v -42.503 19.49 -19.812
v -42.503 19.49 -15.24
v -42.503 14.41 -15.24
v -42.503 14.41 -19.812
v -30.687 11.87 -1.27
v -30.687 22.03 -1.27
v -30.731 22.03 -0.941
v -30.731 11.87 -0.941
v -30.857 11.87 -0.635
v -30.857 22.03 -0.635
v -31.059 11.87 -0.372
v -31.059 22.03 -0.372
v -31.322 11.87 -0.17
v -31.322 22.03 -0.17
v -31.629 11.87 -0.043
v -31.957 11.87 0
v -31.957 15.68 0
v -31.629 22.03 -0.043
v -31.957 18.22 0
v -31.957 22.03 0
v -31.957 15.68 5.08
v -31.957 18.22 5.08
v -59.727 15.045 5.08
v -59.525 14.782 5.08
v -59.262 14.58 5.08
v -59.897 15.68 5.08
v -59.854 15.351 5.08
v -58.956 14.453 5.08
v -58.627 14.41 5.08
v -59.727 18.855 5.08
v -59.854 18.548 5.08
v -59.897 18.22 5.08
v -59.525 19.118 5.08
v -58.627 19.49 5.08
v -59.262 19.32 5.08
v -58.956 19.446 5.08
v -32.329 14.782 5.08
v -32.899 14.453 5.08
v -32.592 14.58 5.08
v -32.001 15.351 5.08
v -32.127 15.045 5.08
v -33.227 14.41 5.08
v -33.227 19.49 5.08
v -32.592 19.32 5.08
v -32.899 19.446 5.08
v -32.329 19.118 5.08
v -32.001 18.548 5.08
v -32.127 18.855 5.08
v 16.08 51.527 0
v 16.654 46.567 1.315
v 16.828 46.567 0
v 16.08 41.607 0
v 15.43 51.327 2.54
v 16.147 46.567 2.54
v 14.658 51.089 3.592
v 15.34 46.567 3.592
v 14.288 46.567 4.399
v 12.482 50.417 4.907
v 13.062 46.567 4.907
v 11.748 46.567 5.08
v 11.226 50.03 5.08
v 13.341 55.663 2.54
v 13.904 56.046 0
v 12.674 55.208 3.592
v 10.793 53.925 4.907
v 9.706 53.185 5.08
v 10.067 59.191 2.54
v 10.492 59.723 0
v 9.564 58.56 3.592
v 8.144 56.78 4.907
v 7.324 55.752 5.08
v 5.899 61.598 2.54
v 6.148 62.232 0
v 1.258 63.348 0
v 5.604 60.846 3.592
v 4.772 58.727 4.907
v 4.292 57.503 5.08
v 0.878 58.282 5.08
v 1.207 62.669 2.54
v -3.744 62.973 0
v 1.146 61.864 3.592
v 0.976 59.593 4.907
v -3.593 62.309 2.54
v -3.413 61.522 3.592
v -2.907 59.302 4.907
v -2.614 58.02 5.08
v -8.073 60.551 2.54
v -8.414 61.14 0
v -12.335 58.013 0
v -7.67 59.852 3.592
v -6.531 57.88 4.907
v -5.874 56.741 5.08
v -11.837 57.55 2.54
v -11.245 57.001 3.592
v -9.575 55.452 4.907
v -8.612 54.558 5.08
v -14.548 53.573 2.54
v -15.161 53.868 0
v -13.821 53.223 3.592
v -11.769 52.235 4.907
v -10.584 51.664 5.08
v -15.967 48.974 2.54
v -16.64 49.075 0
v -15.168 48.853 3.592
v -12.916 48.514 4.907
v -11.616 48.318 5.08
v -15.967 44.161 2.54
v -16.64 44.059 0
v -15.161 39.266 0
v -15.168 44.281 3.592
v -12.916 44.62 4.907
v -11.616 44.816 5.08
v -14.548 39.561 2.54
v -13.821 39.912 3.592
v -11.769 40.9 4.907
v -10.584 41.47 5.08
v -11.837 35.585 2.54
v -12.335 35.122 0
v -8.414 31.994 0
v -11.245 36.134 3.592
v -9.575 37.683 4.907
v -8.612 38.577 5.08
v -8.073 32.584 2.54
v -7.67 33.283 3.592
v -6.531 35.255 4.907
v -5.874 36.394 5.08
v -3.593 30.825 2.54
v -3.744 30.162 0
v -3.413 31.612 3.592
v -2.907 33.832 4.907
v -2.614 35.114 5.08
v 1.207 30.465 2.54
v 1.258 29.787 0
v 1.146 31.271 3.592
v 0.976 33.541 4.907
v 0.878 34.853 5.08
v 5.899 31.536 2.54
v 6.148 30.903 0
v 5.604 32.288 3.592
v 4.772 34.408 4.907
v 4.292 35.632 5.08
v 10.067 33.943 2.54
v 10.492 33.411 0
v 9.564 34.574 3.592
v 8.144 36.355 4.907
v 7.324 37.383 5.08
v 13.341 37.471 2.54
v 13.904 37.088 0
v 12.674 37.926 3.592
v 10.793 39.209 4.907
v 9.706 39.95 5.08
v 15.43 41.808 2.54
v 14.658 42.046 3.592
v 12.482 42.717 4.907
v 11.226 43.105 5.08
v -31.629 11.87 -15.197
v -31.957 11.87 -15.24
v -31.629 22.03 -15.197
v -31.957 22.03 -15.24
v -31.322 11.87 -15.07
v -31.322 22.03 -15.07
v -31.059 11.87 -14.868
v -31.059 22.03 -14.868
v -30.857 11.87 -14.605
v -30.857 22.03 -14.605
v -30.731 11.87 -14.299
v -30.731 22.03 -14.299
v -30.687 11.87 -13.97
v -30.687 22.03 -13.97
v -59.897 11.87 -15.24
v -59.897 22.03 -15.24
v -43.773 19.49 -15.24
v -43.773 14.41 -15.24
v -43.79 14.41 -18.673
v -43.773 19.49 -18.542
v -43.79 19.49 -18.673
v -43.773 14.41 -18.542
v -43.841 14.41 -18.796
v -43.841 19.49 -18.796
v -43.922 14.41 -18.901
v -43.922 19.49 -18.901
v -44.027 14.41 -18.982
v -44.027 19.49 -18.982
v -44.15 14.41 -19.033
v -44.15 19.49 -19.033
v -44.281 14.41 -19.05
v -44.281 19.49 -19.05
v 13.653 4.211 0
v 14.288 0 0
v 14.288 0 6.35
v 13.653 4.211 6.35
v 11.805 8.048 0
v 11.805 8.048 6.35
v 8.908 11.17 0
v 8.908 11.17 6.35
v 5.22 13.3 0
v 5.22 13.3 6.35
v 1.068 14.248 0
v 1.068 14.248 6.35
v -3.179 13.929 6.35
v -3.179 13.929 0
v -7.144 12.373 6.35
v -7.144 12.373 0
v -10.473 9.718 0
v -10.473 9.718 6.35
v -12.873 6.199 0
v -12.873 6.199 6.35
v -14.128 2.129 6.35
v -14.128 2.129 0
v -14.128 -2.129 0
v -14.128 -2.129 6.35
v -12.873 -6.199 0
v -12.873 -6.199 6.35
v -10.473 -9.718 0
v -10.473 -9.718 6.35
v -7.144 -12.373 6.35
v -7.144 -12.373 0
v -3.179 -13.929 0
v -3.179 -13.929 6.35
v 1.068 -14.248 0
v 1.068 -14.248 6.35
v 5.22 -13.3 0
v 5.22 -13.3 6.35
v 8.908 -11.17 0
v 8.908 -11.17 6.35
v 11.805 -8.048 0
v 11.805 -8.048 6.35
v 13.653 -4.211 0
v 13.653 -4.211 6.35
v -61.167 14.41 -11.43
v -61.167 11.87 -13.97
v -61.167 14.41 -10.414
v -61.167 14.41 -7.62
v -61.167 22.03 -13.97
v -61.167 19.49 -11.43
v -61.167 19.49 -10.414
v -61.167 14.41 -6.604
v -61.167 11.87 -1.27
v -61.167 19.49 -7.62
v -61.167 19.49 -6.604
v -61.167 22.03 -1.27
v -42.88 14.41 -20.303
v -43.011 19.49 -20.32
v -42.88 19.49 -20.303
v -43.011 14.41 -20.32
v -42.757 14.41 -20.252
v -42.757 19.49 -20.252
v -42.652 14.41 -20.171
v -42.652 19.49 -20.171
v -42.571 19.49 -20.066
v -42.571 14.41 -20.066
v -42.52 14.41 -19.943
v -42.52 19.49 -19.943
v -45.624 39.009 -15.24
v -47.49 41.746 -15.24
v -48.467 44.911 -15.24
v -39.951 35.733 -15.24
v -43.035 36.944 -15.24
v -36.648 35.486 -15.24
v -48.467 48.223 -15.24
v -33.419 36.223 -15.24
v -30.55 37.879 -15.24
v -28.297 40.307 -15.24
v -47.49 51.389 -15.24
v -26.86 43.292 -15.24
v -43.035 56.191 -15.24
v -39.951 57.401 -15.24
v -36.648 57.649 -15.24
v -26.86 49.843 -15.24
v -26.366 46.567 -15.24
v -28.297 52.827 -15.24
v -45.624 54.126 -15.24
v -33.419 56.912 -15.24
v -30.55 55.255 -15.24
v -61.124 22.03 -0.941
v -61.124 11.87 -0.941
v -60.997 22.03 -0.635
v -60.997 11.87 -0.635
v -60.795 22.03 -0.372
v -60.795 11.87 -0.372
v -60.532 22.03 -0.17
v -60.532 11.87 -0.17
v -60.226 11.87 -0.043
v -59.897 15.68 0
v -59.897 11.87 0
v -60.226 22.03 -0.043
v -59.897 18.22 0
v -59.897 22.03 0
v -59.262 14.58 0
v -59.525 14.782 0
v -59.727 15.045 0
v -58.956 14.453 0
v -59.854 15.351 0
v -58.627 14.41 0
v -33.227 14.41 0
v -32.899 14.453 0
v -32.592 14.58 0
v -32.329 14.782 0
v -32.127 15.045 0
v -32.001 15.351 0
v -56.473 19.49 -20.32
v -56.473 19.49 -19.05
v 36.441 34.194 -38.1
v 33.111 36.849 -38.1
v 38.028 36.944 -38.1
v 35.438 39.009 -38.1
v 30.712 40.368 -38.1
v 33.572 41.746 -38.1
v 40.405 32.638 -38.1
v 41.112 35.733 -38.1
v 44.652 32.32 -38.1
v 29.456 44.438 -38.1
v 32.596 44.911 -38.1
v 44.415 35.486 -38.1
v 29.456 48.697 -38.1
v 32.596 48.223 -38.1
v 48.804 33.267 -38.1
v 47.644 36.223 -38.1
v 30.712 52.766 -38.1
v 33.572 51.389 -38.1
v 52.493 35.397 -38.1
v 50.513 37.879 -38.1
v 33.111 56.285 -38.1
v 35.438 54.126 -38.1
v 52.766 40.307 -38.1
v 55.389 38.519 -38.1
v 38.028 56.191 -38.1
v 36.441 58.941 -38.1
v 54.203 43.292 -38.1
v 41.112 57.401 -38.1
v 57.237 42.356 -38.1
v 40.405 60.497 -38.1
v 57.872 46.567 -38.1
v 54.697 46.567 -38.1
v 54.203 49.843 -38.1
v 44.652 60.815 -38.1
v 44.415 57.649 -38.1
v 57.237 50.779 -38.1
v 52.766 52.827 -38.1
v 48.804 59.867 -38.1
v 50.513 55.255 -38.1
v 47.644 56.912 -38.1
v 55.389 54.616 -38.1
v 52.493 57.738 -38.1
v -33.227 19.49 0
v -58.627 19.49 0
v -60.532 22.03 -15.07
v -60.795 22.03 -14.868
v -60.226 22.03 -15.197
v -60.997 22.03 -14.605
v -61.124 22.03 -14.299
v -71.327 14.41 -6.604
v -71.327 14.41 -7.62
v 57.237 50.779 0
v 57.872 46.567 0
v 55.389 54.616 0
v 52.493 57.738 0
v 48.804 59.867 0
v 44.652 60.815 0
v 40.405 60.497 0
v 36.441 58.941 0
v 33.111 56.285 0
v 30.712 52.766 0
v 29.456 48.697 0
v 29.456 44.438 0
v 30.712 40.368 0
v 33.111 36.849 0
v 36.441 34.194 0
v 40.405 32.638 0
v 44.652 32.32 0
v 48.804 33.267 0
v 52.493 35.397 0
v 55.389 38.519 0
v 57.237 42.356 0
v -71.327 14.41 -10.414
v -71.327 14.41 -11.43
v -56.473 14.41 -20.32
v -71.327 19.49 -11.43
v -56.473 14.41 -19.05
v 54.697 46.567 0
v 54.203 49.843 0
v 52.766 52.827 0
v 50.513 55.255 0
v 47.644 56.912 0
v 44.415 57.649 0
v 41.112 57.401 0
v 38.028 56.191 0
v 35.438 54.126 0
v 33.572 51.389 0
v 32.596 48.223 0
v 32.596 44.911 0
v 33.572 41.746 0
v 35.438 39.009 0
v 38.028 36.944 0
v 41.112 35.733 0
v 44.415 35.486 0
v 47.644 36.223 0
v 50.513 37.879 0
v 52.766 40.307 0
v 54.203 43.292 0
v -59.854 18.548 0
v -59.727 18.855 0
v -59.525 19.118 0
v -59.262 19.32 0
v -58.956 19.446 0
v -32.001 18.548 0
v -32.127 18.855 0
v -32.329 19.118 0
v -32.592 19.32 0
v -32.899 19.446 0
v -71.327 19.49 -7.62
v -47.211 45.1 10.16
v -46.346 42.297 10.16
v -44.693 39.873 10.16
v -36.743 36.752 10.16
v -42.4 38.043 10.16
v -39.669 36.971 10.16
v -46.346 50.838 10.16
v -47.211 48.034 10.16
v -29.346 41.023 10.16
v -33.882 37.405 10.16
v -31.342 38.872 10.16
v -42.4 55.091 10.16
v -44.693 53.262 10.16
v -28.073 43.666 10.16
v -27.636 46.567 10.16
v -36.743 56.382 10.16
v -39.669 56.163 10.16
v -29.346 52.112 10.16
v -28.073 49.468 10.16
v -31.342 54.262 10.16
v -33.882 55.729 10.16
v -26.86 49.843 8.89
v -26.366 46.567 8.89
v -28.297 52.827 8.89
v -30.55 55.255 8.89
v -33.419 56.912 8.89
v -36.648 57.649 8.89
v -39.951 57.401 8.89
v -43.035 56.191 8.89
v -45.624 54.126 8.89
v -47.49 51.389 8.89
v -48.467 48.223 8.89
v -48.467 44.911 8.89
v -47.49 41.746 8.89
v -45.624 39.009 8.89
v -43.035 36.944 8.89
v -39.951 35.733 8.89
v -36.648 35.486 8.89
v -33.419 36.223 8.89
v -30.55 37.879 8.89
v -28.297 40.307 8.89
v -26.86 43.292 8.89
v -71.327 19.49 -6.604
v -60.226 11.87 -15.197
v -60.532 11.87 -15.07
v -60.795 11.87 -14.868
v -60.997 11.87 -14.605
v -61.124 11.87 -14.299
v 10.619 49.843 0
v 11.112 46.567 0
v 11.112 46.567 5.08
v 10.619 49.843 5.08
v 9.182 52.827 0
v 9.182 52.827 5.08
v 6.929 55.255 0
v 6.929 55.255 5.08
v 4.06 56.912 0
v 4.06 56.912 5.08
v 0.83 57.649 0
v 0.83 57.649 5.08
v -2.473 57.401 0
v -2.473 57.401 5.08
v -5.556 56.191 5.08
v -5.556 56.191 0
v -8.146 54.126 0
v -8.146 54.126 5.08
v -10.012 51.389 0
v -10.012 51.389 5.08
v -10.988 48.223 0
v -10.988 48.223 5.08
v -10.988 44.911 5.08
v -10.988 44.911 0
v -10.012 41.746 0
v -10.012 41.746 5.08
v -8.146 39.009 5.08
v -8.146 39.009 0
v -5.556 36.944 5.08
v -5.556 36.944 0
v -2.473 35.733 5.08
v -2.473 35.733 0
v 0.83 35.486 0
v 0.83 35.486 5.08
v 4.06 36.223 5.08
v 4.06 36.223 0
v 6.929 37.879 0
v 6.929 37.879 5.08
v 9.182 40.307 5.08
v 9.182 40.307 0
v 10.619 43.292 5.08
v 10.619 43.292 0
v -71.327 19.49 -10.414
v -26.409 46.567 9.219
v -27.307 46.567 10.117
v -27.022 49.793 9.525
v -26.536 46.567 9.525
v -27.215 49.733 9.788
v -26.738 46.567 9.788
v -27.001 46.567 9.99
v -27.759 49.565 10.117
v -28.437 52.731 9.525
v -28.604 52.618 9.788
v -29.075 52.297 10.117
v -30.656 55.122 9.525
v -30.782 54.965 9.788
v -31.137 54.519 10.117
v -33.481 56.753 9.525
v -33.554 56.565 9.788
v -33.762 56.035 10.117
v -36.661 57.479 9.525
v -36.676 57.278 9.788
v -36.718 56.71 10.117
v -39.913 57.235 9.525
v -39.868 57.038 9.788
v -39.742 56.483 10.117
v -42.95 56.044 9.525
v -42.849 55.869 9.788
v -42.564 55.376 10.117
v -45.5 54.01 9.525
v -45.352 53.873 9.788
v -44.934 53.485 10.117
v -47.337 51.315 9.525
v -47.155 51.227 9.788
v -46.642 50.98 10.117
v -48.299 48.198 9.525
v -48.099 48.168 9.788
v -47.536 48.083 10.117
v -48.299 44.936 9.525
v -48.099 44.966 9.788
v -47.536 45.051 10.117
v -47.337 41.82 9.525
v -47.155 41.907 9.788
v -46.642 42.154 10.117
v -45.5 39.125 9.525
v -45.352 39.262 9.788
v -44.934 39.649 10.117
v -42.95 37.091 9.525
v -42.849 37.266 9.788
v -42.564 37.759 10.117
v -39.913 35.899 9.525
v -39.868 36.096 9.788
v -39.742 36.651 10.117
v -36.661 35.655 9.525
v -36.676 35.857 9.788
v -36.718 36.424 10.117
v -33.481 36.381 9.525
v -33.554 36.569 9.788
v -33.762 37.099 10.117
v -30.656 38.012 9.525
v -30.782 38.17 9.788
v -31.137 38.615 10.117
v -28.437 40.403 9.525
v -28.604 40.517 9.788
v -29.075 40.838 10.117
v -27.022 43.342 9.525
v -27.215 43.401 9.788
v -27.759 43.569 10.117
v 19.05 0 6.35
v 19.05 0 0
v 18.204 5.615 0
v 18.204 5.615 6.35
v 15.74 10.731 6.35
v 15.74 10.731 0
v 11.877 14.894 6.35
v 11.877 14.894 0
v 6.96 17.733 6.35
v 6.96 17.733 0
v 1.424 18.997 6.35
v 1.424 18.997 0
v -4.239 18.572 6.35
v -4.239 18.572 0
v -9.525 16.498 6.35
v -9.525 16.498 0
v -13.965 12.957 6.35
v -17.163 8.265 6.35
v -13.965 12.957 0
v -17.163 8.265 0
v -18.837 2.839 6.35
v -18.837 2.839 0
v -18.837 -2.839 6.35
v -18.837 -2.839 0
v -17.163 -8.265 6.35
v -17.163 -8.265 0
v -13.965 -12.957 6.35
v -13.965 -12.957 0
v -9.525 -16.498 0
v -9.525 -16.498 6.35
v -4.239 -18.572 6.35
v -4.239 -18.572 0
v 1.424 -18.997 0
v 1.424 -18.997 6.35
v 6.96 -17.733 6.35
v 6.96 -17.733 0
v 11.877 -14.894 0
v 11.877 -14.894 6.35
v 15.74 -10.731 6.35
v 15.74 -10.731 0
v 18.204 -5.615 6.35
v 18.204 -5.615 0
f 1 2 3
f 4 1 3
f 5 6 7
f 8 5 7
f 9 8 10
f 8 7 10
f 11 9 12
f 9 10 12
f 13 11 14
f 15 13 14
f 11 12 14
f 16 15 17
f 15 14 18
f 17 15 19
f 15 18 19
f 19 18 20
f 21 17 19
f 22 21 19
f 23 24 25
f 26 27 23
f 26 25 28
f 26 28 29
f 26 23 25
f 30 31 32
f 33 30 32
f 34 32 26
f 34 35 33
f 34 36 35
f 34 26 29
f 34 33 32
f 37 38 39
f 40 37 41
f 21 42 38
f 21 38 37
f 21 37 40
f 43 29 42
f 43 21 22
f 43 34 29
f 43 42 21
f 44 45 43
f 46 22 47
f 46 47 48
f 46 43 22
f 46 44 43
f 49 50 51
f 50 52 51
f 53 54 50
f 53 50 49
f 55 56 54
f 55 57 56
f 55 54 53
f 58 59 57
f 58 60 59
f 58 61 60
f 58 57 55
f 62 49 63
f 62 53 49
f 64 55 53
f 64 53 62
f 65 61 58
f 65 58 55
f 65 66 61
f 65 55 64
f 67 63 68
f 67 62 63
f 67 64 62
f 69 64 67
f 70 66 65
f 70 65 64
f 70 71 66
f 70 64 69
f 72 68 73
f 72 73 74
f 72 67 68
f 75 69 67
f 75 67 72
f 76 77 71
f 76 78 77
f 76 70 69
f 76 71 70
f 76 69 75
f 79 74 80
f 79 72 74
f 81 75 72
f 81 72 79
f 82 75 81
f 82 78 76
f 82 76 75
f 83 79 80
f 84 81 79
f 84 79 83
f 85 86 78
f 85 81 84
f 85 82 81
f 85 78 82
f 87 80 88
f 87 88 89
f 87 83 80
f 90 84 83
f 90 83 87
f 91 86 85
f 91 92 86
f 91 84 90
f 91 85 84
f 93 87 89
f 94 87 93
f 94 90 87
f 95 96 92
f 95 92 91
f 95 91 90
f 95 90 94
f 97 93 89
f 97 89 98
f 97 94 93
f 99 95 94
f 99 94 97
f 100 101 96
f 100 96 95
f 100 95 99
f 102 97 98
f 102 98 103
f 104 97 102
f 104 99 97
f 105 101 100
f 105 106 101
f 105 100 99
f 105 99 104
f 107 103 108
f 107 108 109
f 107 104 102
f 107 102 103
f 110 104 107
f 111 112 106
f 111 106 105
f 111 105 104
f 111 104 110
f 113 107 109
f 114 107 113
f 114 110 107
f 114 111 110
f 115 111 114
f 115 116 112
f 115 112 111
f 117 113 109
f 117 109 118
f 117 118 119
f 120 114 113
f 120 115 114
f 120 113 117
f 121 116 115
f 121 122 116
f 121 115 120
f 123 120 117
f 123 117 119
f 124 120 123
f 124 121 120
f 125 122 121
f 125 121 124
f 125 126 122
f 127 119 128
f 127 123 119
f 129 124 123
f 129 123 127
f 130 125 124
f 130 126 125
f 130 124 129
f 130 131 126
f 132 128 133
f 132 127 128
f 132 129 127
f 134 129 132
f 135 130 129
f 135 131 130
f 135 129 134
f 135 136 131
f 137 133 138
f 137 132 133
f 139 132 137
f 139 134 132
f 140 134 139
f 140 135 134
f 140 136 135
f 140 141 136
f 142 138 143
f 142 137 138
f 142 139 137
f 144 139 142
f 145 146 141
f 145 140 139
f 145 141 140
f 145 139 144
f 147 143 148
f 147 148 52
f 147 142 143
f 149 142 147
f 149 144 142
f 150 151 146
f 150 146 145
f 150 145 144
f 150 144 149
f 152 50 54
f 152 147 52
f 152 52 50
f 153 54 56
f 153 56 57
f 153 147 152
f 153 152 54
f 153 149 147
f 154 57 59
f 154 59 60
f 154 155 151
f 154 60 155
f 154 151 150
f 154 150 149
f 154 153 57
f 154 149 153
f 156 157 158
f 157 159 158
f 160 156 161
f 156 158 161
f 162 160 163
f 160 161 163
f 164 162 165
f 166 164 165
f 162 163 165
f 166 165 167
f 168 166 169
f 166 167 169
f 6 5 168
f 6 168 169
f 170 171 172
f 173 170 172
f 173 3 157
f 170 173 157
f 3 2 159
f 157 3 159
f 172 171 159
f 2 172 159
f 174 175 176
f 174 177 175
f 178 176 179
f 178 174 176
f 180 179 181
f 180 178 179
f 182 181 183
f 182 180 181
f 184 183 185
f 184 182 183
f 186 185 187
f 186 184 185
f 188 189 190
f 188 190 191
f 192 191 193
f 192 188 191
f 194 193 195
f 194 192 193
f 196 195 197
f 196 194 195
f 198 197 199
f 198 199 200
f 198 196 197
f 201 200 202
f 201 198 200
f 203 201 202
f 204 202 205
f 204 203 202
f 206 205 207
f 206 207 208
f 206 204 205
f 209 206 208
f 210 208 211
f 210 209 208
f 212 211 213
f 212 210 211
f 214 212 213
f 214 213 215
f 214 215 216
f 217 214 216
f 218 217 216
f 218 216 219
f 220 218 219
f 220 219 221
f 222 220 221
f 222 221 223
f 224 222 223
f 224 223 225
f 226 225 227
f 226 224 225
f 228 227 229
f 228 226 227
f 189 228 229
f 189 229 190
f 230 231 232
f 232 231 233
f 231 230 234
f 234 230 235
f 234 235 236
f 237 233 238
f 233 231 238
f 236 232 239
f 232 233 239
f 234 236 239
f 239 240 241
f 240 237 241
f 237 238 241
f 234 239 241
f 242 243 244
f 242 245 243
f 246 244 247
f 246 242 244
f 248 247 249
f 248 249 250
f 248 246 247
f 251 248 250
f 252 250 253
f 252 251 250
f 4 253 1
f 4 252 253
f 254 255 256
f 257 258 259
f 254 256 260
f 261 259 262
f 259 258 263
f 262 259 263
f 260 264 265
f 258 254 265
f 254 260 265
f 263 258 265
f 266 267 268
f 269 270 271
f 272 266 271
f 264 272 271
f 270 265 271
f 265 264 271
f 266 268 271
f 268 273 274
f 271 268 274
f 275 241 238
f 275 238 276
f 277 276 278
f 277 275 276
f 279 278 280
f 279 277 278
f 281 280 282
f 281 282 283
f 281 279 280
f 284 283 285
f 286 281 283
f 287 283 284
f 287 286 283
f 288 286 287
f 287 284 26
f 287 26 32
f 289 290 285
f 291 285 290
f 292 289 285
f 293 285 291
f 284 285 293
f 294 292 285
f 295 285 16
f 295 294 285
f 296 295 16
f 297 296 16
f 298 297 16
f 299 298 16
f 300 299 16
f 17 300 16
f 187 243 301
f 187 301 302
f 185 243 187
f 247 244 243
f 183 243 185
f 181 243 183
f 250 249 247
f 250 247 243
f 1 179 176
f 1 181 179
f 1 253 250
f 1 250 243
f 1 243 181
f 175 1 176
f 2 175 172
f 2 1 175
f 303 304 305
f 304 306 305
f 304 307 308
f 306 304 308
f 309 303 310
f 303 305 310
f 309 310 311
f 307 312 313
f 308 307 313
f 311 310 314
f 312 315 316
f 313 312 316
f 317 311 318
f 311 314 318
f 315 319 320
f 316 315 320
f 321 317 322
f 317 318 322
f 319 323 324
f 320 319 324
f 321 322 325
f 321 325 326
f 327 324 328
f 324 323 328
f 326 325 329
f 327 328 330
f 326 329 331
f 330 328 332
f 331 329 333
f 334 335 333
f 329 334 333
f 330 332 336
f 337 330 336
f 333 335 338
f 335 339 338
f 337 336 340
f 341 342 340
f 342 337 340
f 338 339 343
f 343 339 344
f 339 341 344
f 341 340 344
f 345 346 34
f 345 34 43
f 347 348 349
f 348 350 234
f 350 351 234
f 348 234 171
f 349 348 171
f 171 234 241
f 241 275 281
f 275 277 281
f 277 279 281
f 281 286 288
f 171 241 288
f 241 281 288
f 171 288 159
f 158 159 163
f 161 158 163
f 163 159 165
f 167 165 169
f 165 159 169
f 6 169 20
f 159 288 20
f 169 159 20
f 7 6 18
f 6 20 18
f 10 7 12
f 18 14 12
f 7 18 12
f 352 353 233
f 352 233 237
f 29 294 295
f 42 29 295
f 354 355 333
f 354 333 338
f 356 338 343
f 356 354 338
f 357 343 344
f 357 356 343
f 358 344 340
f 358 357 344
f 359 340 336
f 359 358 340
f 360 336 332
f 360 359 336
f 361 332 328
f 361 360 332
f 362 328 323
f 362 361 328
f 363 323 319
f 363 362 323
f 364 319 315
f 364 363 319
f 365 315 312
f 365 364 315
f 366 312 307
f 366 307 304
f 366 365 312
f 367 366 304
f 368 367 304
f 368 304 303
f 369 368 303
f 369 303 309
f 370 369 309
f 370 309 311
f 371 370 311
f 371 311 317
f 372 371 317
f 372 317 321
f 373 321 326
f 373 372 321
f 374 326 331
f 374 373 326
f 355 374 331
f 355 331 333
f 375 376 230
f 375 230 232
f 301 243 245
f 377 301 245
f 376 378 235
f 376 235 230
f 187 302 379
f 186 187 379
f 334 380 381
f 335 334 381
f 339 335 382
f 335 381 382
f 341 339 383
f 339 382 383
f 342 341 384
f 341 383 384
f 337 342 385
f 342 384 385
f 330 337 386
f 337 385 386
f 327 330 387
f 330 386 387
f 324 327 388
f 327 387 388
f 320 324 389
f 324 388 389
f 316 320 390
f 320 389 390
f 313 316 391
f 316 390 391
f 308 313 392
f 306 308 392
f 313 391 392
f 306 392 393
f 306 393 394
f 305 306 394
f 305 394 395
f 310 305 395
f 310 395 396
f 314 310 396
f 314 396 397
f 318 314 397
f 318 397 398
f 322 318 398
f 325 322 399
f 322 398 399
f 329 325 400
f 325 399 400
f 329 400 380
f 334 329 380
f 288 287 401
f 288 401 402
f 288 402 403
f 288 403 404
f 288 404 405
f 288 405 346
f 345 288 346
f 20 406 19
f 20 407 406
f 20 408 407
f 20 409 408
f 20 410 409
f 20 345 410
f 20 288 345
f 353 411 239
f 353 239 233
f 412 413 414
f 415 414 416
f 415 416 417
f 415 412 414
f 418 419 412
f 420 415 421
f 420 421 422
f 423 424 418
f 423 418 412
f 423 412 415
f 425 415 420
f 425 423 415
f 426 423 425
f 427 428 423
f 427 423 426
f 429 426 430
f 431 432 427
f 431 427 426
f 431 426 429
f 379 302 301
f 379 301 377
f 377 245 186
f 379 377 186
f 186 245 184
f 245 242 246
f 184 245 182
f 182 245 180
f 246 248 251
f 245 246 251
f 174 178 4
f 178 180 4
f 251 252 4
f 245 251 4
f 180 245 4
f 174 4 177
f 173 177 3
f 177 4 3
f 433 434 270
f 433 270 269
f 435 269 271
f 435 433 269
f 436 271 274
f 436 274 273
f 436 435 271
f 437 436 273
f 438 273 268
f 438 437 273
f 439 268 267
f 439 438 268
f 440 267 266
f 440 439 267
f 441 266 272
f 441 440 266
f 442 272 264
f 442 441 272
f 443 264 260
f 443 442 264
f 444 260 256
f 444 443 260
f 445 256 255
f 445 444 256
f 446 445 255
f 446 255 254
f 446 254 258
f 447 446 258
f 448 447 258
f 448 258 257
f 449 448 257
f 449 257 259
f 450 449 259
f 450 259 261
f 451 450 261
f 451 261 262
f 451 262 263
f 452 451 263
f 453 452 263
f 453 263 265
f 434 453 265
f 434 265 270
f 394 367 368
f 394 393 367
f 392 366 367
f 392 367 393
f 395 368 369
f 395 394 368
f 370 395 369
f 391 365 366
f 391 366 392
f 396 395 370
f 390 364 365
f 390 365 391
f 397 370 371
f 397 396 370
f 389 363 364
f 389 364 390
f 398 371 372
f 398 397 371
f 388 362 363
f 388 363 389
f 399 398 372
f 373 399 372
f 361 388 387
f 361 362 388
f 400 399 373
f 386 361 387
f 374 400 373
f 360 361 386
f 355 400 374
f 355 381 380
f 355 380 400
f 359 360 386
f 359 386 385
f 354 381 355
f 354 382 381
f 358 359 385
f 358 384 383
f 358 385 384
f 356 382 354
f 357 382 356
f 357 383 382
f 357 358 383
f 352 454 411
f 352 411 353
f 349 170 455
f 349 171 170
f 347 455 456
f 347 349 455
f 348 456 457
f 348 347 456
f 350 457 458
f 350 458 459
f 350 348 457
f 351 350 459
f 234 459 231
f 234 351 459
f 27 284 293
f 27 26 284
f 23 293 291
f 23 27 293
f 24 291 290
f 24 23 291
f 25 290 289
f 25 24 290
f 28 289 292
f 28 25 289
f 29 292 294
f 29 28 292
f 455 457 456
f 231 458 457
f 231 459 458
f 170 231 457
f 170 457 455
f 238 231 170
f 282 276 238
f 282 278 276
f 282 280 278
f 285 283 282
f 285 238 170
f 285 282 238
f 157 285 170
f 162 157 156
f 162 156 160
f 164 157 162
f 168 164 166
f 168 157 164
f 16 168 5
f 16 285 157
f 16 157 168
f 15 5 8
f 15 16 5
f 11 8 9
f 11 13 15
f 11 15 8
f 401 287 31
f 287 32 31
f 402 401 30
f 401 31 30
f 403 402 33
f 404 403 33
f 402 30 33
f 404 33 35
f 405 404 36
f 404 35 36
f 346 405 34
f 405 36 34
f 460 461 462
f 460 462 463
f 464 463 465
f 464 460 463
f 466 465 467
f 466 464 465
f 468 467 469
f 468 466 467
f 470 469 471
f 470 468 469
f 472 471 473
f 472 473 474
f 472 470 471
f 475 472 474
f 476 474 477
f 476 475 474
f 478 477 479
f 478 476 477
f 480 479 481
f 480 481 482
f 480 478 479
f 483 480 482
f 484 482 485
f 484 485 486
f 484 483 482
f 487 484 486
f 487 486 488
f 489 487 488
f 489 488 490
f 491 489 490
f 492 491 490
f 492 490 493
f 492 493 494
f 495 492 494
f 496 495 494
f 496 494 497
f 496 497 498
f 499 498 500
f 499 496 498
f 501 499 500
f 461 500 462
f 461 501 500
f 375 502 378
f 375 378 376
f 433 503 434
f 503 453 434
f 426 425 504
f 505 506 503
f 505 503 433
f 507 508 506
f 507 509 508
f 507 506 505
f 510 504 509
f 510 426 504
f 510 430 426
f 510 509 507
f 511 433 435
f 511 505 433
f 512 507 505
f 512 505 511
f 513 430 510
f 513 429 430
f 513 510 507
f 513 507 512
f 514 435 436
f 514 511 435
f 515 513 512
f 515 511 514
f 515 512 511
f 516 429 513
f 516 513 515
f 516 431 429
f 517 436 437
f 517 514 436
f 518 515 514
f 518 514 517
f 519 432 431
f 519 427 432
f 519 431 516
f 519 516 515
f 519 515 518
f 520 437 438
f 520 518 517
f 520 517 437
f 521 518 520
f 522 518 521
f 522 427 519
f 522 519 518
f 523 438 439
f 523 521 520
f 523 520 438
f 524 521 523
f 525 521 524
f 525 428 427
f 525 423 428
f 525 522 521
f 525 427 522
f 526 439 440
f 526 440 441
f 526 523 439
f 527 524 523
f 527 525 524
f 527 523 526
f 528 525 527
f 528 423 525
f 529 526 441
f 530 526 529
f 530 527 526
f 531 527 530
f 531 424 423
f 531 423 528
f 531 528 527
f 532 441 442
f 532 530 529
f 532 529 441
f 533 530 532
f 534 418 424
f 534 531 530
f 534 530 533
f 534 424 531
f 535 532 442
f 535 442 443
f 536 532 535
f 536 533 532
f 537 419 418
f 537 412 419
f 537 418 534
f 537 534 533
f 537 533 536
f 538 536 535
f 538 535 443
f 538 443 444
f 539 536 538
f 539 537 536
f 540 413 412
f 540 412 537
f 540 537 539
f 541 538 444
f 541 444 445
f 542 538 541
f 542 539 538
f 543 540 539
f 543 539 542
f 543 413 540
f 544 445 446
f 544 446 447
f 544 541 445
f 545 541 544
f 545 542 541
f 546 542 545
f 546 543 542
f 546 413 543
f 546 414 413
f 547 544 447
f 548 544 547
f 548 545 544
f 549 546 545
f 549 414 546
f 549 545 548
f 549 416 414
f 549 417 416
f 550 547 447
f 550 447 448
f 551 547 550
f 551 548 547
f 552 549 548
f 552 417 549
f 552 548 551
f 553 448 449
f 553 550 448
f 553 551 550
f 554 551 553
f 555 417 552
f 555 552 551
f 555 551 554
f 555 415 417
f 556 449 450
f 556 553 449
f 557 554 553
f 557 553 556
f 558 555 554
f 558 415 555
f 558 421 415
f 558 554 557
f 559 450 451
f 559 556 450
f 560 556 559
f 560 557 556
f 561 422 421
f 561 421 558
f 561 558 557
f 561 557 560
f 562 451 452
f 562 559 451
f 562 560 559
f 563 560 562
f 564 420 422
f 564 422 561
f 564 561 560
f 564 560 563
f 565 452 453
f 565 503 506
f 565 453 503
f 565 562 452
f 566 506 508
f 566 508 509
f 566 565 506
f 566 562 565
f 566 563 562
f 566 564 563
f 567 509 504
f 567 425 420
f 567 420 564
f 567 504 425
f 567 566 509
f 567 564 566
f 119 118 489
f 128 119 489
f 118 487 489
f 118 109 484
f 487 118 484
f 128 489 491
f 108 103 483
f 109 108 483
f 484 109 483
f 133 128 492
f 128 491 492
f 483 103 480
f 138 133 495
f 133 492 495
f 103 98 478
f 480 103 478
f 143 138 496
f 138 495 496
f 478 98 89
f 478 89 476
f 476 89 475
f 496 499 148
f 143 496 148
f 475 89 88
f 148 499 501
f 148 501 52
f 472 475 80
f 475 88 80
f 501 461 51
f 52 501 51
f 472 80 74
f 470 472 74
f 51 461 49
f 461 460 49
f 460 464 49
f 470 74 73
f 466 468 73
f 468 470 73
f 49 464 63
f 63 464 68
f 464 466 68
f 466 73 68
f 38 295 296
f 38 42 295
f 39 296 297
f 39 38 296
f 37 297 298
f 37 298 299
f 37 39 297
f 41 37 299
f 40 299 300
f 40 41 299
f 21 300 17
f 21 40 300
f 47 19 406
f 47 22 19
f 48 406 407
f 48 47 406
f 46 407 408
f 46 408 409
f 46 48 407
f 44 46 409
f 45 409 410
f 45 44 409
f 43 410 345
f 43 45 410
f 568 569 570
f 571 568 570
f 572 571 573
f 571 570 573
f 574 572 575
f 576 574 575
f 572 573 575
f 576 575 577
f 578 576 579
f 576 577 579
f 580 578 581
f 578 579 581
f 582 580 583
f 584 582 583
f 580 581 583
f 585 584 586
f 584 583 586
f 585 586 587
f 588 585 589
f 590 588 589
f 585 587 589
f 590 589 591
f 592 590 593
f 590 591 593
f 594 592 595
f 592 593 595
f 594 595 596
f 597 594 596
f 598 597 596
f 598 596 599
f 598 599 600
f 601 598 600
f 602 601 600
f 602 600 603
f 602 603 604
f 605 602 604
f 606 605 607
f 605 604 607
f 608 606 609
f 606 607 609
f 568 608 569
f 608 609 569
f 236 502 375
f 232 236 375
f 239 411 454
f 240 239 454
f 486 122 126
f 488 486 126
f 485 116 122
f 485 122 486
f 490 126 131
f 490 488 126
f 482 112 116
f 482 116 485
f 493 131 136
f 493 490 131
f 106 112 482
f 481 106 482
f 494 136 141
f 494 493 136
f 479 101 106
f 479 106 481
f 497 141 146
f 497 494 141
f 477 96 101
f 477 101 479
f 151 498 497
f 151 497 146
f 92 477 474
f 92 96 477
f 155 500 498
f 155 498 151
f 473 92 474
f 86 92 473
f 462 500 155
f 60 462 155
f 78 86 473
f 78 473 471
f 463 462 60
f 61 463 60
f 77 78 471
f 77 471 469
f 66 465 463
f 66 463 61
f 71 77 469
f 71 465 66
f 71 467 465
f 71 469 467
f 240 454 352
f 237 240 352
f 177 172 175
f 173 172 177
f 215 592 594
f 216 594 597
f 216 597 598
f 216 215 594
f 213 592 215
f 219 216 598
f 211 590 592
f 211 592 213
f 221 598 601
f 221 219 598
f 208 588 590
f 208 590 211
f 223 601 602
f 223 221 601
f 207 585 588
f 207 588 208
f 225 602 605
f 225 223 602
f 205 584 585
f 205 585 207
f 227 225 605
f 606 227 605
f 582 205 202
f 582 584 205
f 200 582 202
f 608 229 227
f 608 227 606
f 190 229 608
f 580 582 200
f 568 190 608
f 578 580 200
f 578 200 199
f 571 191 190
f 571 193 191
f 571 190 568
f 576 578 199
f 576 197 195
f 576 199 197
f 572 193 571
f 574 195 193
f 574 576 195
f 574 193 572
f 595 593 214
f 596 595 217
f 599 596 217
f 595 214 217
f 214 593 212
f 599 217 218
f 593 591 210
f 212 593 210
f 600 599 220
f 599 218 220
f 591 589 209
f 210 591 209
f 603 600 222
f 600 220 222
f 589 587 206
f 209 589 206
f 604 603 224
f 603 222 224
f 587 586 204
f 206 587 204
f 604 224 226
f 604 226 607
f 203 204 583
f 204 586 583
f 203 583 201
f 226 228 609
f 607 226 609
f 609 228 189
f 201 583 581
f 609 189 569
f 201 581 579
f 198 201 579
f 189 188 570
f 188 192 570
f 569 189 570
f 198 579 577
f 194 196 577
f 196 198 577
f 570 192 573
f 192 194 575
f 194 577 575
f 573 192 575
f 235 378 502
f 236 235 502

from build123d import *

# Parameters (mm, degrees)
F0_W      = 30.48
F0_H      = 10.16
F1_DEPTH  = 15.24
F2_W      = 5.08
F2_H      = 1.016
F3_DEPTH  = 10.16
F4_W      = 1.27
F4_H      = 5.08
F5_DEPTH  = 5.08
F6_W      = 5.08
F6_H      = 1.27
F7_DEPTH  = 12.7
F8_R      = 0.508
F9_R      = 1.27
F10_W     = 27.94
F10_H     = 5.08
F11_DEPTH = 5.08
F12_R     = 1.27
F13_R     = 14.2875
F13_R_2   = 11.1125
F14_DEPTH = 38.1
F13_R_3   = 16.8275
F15_DEPTH = 5.08
F16_DEPTH = 10.16
F17_DEPTH = 15.24
F18_R     = 1.27
F19_R     = 5.07999
F13_R_4   = 19.05
F20_DEPTH = 6.35


# Not quite as in the source:
# - a fillet or chamfer is up to 0.001 mm smaller than in the source, because OpenCascade refuses the exact size


with BuildPart() as f1:
    # F0 (on Top) → F1 (new body)
    with BuildSketch(Plane.XY):
        with Locations((-45.9272513187, 16.9497304279)):
            Rectangle(F0_W, F0_H)
    extrude(amount=-F1_DEPTH)

    # F2 (on face) → F3 (join)
    with BuildSketch(Plane(origin=(-61.1672513187, 0, 0), x_dir=(0, -1, 0), z_dir=(-1, 0, 0))):
        with Locations((-16.9497304279, -7.112)):
            Rectangle(F2_W, F2_H)
        with Locations((-16.9497304279, -10.922)):
            Rectangle(F2_W, F2_H)
    extrude(amount=F3_DEPTH)

    # F4 (on face) → F5 (join)
    with BuildSketch(Plane(origin=(0, 0, -15.24), x_dir=(1, 0, 0), z_dir=(0, 0, -1))):
        with Locations((-43.1381706691, -16.9497304279)):
            Rectangle(F4_W, F4_H)
    extrude(amount=F5_DEPTH)

    # F6 (on face) → F7 (join)
    with BuildSketch(Plane(origin=(-43.7731706691, 0, 0), x_dir=(0, -1, 0), z_dir=(-1, 0, 0))):
        with Locations((-16.9497304279, -19.685)):
            Rectangle(F6_W, F6_H)
    extrude(amount=F7_DEPTH)

    # F8
    f8_edges = [f1.edges().sort_by_distance(p)[0] for p in [
        (-42.503171, 16.94973, -20.32),
        (-43.773171, 16.94973, -19.05),
    ]]
    fillet(f8_edges, radius=F8_R)

    # F9
    f9_edges = [f1.edges().sort_by_distance(p)[0] for p in [
        (-30.687251, 16.94973, -15.24),
        (-61.167251, 16.94973, -15.24),
        (-30.687251, 16.94973, 0),
        (-61.167251, 16.94973, 0),
    ]]
    fillet(f9_edges, radius=F9_R)

    # F10 (on face) → F11 (join)
    with BuildSketch(Plane.XY):
        with Locations((-45.9272513187, 16.9497304279)):
            Rectangle(F10_W, F10_H)
    extrude(amount=F11_DEPTH)

    # F12
    f12_edges = [f1.edges().sort_by_distance(p)[0] for p in [
        (-31.957251, 14.40973, 2.54),
        (-59.897251, 14.40973, 2.54),
        (-59.897251, 19.48973, 2.54),
        (-31.957251, 19.48973, 2.54),
    ]]
    fillet(f12_edges, radius=F12_R)


with BuildPart() as f14:
    # F13 (on Top) → F14 (new body)
    with BuildSketch(Plane.XY):
        with Locations((43.5843914747, 46.5672239661)):
            Circle(F13_R)
        with Locations((43.5843914747, 46.5672239661)):
            Circle(F13_R_2, mode=Mode.SUBTRACT)
    extrude(amount=-F14_DEPTH)


with BuildPart() as f15:
    # F13 (on Top) → F15 (new body)
    with BuildSketch(Plane.XY):
        with Locations((0, 46.5672239661)):
            Circle(F13_R_3)
        with Locations((0, 46.5672239661)):
            Circle(F13_R_2, mode=Mode.SUBTRACT)
    extrude(amount=F15_DEPTH)

    # F19 (radius 5.08 in the source; OpenCascade refuses exactly that, so slightly less here)
    f19_edges = [f15.edges().sort_by_distance(p)[0] for p in [
        (-16.8275, 46.567224, 5.08),
    ]]
    fillet(f19_edges, radius=F19_R)


with BuildPart() as f16:
    # F13 (on Top) → F16 (new body)
    with BuildSketch(Plane.XY):
        with Locations((-37.4783687294, 46.5672239661)):
            Circle(F13_R_2)
    extrude(amount=F16_DEPTH)

    # F17 (add): a face of the model
    f17_faces = [f16.faces().sort_by_distance(p)[0] for p in [
        (-37.4783687294, 46.5672239661, 0),
    ]]
    extrude(f17_faces, amount=F17_DEPTH)

    # F18
    f18_edges = [f16.edges().sort_by_distance(p)[0] for p in [
        (-48.590869, 46.567224, 10.16),
    ]]
    fillet(f18_edges, radius=F18_R)


with BuildPart() as f20:
    # F13 (on Top) → F20 (new body)
    with BuildSketch(Plane.XY):
        Circle(F13_R_4)
        Circle(F13_R, mode=Mode.SUBTRACT)
    extrude(amount=F20_DEPTH)


solid = Compound([f1.part, f14.part, f15.part, f16.part, f20.part])
